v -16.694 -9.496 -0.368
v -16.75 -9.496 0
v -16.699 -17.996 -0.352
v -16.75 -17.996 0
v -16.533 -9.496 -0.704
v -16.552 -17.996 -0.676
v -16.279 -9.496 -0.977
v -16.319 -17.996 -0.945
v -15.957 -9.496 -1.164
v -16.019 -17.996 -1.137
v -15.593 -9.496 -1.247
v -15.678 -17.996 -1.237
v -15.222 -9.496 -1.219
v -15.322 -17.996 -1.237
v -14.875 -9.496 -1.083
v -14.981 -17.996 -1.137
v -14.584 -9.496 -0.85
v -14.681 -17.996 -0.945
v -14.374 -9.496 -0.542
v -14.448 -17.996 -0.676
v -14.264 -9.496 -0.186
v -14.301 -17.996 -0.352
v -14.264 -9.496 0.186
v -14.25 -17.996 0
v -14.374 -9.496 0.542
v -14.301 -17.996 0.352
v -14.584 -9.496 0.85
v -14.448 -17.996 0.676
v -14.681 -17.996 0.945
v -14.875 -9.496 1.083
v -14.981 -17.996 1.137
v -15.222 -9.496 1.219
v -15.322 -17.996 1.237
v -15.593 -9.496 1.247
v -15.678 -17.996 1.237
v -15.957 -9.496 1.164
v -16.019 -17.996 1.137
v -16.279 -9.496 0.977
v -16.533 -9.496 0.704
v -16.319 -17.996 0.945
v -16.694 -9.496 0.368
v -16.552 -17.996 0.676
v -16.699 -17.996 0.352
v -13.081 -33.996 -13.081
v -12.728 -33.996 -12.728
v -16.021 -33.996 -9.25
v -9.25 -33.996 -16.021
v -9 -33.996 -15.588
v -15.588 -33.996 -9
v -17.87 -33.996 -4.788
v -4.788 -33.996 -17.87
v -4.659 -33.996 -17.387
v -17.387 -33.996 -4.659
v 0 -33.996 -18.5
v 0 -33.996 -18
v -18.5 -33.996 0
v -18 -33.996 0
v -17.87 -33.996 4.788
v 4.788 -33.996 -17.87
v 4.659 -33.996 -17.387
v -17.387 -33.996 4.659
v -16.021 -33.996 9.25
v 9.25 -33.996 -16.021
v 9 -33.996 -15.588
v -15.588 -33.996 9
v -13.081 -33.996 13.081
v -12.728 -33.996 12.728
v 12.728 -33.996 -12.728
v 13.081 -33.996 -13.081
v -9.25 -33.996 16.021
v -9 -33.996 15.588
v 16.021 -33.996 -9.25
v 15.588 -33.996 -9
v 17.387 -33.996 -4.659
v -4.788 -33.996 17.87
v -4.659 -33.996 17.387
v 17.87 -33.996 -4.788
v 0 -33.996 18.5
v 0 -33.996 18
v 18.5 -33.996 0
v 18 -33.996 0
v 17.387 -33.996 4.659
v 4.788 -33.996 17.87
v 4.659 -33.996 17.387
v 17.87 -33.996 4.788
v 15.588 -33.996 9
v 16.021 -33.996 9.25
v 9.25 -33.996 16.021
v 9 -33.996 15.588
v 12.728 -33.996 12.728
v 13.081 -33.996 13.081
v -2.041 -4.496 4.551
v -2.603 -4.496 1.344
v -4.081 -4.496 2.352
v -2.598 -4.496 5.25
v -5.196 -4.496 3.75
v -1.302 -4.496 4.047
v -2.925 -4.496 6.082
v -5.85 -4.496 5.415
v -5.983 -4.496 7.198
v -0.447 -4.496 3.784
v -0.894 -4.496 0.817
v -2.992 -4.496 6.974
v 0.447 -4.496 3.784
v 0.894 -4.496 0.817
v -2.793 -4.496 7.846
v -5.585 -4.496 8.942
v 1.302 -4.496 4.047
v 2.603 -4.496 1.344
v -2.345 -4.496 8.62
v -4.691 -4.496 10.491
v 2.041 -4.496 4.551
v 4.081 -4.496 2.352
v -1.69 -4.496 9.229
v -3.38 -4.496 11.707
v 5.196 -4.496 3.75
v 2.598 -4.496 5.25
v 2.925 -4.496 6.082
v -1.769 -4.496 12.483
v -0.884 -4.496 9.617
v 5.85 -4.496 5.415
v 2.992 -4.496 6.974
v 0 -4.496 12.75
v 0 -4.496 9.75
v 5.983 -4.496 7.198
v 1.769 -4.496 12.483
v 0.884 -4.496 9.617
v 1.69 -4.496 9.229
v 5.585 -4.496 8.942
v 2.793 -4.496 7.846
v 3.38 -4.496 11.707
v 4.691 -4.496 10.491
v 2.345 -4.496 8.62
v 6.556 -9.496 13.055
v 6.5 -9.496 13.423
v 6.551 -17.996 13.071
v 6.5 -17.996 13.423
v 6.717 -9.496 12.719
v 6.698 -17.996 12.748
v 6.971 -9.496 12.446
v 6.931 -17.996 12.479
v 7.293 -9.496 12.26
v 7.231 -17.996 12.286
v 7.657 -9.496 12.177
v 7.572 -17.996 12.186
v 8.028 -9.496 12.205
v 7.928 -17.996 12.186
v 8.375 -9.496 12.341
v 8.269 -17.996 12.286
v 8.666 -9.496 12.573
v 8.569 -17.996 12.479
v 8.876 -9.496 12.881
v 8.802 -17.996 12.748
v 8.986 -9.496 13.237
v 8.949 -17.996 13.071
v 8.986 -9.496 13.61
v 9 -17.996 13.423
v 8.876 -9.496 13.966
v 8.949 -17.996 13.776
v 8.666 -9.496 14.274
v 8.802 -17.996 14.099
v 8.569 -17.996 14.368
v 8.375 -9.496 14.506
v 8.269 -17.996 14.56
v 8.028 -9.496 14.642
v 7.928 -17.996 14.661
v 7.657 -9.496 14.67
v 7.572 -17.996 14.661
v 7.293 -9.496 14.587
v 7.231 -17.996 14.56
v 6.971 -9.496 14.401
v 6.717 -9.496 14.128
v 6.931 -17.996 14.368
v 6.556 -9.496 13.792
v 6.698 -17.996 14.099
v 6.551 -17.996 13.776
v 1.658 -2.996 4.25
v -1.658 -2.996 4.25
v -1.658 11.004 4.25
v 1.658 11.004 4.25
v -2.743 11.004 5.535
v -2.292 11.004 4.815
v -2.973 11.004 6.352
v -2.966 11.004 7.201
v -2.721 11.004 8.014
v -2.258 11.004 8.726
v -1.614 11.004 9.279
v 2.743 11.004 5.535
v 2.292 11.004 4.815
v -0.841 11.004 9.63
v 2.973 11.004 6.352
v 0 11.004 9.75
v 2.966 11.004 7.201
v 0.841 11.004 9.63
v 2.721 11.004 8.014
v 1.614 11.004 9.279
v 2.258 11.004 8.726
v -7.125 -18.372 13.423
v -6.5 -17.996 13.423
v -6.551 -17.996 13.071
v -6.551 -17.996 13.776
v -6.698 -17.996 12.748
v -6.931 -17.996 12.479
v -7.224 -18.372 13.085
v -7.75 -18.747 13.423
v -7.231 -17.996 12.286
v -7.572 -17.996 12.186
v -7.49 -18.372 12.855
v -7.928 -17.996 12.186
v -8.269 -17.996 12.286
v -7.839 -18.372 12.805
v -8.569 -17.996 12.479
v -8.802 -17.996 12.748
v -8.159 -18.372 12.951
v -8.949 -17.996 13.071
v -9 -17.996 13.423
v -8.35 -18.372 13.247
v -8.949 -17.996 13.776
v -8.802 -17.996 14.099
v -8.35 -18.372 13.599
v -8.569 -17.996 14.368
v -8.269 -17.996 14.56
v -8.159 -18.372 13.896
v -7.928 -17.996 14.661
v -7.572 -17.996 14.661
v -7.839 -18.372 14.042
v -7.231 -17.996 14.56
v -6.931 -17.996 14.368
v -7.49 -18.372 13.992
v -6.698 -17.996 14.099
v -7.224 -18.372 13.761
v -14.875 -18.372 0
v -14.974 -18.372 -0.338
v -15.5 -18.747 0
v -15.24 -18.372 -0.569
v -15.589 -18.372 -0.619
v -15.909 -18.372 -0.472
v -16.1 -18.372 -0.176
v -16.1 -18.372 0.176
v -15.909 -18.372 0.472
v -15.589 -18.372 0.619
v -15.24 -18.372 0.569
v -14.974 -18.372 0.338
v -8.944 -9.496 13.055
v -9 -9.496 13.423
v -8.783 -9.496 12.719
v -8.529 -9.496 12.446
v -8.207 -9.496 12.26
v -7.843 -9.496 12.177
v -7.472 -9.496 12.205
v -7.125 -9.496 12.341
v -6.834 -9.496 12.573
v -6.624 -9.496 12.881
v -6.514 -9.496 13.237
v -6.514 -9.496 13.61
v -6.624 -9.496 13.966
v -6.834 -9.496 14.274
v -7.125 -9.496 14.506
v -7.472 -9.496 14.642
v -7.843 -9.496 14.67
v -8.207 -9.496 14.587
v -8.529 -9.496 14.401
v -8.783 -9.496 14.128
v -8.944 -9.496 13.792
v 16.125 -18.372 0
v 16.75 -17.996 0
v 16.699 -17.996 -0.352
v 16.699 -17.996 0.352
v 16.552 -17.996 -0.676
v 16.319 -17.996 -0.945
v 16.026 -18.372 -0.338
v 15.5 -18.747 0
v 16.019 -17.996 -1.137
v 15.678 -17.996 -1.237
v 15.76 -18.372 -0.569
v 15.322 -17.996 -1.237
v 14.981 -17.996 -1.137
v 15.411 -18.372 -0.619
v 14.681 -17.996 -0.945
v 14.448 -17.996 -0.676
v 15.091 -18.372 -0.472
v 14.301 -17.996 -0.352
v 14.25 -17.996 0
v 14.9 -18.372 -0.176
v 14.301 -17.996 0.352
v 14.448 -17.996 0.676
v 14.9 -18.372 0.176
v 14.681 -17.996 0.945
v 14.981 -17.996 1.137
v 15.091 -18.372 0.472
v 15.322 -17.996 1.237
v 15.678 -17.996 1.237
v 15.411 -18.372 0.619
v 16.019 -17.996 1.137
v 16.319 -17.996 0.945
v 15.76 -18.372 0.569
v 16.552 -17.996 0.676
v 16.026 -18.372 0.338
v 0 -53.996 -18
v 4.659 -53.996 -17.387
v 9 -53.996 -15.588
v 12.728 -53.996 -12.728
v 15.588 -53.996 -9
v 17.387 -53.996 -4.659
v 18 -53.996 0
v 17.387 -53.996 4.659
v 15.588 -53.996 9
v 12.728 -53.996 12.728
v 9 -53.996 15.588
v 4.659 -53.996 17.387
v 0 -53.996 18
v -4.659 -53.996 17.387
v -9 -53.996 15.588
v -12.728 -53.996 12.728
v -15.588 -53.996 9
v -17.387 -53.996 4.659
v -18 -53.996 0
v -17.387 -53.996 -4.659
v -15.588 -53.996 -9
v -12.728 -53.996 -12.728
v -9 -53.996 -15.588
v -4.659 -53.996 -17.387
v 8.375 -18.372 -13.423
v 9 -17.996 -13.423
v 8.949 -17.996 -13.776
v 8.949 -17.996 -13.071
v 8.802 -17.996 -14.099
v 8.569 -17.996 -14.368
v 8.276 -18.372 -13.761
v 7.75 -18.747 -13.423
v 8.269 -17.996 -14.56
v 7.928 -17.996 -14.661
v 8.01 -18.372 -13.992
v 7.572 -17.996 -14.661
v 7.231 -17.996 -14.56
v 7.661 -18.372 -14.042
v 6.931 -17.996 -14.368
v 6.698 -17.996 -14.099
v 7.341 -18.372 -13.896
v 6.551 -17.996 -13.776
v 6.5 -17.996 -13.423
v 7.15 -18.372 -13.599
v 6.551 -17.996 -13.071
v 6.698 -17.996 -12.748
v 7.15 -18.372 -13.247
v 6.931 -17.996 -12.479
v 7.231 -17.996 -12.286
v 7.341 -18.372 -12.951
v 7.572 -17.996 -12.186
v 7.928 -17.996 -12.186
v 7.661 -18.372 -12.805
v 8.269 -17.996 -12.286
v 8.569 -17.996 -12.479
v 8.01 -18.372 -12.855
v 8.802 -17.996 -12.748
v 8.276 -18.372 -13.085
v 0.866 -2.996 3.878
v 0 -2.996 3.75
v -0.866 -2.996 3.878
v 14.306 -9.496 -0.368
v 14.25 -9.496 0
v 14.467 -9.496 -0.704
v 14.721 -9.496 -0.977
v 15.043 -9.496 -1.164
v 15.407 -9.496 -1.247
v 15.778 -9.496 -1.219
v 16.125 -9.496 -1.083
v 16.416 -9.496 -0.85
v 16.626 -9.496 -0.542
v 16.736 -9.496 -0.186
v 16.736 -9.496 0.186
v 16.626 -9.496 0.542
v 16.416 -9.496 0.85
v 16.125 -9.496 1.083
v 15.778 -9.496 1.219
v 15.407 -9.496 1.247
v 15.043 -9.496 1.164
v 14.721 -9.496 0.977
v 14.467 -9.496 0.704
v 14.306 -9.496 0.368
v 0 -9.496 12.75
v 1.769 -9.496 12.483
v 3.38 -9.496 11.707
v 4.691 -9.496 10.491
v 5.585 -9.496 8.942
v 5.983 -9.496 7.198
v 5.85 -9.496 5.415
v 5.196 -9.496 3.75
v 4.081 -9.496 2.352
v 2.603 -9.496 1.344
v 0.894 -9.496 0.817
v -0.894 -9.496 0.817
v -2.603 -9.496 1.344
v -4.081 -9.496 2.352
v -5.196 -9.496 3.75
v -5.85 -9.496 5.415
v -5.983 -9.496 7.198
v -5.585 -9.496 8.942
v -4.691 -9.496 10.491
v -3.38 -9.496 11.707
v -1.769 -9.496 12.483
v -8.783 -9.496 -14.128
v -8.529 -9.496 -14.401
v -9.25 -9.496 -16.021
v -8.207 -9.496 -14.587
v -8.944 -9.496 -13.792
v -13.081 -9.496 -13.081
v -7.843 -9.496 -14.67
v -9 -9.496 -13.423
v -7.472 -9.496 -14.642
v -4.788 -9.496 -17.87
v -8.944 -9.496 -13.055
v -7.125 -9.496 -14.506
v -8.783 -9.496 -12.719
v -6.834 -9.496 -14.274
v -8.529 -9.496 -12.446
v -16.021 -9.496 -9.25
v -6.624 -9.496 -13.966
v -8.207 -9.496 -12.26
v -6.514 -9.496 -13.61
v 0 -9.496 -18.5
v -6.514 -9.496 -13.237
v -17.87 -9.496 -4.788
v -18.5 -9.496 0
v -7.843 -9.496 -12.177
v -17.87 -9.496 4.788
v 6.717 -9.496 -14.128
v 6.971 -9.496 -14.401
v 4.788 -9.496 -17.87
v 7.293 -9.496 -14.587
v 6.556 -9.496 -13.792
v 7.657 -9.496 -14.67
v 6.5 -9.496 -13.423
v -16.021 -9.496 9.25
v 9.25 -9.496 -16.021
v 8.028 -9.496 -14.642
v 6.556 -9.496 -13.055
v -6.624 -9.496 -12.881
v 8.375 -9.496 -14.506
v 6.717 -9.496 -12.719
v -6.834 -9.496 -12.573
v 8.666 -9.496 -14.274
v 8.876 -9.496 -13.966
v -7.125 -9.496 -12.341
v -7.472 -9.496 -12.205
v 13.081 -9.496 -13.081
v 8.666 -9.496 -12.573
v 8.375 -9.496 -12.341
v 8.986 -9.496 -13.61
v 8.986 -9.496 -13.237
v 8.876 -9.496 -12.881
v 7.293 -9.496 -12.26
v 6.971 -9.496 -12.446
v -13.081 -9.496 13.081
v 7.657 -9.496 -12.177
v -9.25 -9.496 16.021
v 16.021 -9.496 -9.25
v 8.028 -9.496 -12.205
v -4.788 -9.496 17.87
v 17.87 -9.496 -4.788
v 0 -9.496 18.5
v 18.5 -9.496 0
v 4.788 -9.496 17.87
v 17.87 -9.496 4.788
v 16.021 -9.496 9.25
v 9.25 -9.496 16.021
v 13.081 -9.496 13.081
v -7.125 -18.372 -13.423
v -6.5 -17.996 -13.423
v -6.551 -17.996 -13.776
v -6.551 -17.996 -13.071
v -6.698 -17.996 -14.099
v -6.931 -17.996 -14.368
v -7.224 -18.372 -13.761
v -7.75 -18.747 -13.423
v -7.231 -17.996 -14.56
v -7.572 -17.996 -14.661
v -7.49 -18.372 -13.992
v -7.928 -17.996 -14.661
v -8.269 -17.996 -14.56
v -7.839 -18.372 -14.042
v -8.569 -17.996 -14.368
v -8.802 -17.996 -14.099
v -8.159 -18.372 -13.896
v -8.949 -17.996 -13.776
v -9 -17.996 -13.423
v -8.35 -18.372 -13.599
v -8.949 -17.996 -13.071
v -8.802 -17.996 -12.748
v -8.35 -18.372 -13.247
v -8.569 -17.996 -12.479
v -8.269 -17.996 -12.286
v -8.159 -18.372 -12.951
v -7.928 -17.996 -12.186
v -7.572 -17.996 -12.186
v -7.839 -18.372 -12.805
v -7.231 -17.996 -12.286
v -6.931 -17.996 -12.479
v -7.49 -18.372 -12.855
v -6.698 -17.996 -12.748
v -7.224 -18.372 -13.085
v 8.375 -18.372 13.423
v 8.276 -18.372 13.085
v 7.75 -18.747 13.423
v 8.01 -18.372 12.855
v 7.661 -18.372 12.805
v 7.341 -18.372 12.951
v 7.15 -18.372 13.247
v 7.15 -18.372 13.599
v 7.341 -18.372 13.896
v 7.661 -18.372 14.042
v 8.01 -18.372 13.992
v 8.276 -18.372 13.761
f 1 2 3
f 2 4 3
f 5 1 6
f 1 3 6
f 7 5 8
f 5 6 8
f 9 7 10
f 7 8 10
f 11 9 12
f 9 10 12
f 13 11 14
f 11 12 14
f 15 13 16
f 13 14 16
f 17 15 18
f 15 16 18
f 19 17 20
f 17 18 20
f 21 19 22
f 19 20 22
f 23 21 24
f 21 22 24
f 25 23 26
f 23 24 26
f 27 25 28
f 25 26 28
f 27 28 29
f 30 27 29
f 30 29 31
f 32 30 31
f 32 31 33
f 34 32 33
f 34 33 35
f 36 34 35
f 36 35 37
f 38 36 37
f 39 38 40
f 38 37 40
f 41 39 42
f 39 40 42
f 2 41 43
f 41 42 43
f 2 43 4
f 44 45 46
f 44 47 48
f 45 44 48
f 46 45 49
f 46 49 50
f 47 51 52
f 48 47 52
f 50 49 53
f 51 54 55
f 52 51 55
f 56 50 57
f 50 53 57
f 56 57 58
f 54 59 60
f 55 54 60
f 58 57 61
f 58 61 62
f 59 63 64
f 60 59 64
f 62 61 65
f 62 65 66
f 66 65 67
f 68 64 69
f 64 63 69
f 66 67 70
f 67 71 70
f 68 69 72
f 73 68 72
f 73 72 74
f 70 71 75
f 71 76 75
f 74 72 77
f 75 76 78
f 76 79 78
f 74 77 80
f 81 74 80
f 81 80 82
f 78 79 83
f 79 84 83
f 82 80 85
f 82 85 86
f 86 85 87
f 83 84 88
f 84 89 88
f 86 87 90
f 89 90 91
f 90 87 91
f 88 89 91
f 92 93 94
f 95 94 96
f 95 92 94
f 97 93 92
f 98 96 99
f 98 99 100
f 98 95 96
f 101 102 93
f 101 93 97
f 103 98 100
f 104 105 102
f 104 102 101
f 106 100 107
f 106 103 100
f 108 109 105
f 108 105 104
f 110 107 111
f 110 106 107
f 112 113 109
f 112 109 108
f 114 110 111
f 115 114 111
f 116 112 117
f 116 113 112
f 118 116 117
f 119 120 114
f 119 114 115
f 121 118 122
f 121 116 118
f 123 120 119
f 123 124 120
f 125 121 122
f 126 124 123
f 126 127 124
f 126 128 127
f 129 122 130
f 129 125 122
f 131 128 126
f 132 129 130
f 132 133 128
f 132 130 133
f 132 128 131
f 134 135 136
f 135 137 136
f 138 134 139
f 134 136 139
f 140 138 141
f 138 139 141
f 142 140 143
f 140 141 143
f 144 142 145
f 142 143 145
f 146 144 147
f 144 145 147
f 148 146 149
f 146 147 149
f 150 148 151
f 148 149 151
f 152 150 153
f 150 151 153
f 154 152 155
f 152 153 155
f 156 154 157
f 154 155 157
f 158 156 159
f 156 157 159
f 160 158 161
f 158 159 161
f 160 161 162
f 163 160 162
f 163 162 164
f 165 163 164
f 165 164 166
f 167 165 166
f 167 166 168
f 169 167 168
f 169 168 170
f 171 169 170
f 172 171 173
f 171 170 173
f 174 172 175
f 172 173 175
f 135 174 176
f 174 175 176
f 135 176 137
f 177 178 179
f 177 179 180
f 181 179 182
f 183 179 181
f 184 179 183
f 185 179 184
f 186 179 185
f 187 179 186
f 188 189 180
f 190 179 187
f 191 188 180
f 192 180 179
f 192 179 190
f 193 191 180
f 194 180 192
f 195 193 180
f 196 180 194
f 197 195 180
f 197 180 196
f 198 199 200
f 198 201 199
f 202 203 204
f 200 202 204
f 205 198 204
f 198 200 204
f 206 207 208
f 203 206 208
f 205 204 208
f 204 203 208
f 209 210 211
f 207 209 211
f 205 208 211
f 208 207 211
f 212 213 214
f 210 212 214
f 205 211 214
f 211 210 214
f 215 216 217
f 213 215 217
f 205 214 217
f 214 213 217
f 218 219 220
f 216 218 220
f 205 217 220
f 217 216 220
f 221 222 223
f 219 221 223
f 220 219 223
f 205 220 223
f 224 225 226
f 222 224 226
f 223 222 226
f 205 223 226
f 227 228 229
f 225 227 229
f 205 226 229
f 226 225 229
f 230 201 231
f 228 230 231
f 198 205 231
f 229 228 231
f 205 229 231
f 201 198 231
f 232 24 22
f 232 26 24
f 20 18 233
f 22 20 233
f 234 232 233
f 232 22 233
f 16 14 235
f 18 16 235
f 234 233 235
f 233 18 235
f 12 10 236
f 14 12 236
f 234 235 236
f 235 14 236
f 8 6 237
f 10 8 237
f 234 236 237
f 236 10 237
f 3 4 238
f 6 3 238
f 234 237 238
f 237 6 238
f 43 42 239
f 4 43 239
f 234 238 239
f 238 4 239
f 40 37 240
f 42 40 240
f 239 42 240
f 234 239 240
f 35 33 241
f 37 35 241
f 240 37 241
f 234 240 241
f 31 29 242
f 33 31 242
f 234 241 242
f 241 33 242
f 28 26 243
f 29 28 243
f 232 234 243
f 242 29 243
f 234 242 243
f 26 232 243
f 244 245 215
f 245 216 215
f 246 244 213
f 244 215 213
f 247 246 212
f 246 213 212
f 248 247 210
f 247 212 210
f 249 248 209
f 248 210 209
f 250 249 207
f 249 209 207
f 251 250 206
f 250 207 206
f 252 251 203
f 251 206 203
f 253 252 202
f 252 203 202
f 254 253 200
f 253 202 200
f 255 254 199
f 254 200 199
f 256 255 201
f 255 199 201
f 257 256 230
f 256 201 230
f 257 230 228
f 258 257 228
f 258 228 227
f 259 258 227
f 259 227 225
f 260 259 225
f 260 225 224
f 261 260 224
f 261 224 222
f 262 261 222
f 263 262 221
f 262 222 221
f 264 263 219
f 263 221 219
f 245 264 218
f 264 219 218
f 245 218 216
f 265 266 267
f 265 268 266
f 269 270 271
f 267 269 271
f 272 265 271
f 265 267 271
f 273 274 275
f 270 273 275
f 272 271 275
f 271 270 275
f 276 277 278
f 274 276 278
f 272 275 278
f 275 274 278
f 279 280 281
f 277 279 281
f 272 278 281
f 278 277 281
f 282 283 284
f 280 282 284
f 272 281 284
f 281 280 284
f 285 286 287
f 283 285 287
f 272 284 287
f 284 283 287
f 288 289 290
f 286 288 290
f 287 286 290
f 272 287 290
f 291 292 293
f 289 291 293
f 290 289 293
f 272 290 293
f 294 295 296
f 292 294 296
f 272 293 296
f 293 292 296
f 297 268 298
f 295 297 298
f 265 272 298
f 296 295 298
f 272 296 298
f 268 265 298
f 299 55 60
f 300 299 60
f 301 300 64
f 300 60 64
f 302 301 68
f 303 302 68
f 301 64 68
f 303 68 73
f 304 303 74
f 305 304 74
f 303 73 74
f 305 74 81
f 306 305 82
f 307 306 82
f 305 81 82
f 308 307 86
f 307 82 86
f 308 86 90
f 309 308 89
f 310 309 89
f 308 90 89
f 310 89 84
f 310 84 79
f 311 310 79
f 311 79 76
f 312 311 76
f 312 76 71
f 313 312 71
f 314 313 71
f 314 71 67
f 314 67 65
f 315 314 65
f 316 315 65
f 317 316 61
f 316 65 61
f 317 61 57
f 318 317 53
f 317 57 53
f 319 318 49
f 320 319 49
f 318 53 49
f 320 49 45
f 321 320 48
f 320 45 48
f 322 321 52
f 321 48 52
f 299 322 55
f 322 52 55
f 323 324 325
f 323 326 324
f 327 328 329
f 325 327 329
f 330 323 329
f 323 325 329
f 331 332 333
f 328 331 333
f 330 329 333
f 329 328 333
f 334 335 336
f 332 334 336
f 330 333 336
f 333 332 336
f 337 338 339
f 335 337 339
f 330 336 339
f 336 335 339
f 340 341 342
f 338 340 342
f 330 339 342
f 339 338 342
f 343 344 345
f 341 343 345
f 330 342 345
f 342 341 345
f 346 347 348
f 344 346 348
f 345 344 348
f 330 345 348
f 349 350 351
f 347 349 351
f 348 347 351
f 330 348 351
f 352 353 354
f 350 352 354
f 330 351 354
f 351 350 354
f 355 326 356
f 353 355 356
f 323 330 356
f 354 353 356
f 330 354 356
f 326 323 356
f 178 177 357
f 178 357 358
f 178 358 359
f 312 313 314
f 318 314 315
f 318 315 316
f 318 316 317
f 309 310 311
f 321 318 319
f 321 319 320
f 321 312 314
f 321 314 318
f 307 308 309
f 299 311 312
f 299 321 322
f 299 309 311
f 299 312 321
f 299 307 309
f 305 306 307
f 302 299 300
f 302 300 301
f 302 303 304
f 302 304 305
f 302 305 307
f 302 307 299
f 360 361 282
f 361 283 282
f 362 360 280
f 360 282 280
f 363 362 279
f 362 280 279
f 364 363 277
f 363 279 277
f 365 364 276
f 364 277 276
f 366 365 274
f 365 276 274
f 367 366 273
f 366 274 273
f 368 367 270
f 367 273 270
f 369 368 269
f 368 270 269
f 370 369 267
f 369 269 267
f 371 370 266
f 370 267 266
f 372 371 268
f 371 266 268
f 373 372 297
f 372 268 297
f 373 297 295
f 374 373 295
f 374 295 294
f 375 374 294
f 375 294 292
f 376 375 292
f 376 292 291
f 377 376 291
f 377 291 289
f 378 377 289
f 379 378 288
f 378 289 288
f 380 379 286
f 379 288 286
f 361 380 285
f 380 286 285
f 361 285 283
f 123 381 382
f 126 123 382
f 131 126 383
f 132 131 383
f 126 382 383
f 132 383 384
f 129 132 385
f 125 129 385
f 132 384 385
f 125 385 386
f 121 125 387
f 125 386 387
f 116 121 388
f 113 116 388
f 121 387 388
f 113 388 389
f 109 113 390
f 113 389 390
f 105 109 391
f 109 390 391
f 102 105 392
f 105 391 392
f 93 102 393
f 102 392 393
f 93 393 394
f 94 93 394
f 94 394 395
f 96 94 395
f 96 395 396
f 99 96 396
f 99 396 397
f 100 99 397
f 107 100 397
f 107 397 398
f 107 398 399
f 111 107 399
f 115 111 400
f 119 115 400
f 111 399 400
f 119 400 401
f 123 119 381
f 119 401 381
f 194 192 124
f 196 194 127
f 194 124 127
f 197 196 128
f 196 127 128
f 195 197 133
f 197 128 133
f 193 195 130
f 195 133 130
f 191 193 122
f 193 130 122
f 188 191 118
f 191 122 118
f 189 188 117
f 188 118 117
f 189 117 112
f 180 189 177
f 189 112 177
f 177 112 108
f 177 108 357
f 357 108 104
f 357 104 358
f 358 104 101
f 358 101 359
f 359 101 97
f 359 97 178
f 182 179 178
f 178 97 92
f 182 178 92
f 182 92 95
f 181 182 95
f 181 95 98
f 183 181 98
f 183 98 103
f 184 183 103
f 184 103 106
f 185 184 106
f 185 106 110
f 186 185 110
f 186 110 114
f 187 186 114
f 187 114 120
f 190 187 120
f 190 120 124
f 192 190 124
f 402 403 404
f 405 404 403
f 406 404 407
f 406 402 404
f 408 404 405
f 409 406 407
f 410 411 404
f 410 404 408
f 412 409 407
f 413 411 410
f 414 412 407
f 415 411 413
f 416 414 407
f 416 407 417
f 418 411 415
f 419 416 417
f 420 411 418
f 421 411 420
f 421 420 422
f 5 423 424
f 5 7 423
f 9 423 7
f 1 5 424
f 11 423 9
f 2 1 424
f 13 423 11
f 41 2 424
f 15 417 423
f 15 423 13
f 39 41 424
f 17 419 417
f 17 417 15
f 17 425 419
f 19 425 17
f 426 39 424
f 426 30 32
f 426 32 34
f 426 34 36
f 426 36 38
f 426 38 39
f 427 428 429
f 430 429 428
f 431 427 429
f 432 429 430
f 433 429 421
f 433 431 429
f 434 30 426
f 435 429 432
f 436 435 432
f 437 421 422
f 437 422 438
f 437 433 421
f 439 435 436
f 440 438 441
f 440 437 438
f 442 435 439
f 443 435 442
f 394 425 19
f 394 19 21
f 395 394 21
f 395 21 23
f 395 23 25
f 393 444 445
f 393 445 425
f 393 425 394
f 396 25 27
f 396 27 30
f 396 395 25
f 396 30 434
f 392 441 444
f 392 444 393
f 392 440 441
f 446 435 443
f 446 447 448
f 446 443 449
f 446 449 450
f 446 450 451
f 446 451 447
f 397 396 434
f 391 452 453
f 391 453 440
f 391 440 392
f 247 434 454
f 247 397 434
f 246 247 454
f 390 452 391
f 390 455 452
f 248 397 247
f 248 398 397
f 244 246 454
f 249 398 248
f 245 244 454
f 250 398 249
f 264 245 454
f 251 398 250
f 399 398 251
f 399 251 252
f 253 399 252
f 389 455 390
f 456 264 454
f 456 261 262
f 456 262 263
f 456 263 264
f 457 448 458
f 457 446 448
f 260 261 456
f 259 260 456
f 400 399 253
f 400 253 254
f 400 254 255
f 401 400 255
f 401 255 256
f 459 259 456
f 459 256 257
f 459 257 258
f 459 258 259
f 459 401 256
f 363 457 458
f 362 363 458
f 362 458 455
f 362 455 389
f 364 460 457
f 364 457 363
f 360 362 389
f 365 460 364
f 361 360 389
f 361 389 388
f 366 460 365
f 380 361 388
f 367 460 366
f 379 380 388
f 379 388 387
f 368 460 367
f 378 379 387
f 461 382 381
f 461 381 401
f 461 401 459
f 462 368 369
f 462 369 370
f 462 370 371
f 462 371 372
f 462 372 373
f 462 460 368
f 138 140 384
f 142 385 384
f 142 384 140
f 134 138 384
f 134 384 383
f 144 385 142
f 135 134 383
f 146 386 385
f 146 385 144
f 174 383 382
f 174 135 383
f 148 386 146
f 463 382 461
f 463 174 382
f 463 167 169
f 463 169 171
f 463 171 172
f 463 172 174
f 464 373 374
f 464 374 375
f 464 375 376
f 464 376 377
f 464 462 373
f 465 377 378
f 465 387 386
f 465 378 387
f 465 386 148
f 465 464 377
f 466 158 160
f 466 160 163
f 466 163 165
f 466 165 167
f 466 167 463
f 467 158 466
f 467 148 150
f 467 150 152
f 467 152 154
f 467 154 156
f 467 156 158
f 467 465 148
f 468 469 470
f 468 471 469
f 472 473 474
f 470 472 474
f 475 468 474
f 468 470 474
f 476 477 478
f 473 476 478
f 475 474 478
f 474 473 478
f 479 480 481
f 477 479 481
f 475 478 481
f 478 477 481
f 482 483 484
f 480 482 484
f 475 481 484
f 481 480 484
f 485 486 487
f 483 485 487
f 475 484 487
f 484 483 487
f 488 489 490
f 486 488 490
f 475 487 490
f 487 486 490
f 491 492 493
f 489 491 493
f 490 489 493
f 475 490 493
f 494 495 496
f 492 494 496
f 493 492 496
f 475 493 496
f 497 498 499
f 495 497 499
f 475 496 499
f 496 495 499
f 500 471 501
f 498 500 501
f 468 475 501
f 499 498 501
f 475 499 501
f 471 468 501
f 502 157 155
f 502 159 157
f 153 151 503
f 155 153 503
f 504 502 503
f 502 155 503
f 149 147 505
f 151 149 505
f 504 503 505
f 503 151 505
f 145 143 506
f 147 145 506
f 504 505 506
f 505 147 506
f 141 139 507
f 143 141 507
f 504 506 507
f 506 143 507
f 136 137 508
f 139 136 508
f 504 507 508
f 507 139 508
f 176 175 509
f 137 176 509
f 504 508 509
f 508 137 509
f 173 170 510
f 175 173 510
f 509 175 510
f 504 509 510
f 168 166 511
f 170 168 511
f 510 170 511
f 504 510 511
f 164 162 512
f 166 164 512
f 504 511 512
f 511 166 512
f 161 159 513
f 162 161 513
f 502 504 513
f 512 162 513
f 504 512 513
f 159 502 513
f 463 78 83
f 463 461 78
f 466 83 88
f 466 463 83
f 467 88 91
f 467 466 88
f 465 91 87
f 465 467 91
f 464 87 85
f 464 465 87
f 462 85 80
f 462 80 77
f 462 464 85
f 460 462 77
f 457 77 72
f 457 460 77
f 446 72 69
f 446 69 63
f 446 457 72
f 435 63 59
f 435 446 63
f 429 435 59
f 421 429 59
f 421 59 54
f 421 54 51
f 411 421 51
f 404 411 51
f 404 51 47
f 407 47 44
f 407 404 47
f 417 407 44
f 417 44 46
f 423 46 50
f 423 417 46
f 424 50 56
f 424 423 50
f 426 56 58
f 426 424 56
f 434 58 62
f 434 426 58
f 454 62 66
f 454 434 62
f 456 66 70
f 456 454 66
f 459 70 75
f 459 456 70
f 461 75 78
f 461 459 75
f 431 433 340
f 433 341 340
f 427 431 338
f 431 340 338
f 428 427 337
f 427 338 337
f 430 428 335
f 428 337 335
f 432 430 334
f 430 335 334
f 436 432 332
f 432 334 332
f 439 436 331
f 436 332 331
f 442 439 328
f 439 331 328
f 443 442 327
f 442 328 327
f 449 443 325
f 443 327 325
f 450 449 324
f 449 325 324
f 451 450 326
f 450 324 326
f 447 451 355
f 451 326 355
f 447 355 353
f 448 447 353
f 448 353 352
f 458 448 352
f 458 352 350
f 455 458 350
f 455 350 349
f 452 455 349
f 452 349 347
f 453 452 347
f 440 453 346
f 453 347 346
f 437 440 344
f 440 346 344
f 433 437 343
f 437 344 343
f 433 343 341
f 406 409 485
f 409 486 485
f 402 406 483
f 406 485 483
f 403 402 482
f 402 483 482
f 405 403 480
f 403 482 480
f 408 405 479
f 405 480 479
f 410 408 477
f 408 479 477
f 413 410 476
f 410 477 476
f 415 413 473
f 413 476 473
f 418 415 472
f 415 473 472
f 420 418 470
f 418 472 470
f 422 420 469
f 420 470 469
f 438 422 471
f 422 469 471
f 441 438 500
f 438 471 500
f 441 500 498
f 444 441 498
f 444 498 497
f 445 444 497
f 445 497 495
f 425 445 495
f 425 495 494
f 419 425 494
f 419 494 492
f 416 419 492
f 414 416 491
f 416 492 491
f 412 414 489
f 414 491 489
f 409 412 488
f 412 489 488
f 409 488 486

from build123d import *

# Parameters (mm, degrees)
SKETCH_1_W                  = 18.5
SKETCH_1_H                  = 24.5
SKETCH_2_R                  = 6
EXTRUDE_1_DEPTH             = 5
SKETCH_3_R                  = 3
EXTRUDE_2_DEPTH             = 15.5
CUT_EXTRUDE_START           = -14
CUT_EXTRUDE_1_DEPTH         = 14
SKETCH_5_R                  = 18
EXTRUDE_3_DEPTH             = 20
HOLE_WIZARD_2_5_2_5_1_D     = 2.5
HOLE_WIZARD_2_5_2_5_1_DEPTH = 8.5
HOLE_WIZARD_2_5_2_5_1_TIP   = 0.751075774


with BuildPart() as part:
    # 草图1 → 旋转1 (revolve)
    with BuildSketch(Plane(origin=(0, 0, 0), x_dir=(-1, 0, 0), z_dir=(0, 0, -1)), mode=Mode.PRIVATE) as revolve_1_sk:
        with Locations((-9.25, -21.746377743)):
            Rectangle(SKETCH_1_W, SKETCH_1_H)
    revolve(revolve_1_sk.sketch.rotate(Axis((0, -33.996377743, 0), (0, 1, 0)), 270), axis=Axis((0, -33.996377743, 0), (0, 1, 0)))

    # 草图2 → 凸台-拉伸1 (add)
    with BuildSketch(Plane(origin=(0, -9.496377743, 0), x_dir=(-1, 0, 0), z_dir=(0, 1, 0))):
        with Locations(Location((0, 6.75, 0), (0, 0, 90))):
            Circle(SKETCH_2_R)
    extrude(amount=EXTRUDE_1_DEPTH)

    # 草图3 → 凸台-拉伸2 (add)
    with BuildSketch(Plane(origin=(0, -4.496377743, 0), x_dir=(-1, 0, 0), z_dir=(0, 1, 0))):
        with Locations(Location((0, 6.75, 0), (0, 0, 90))):
            Circle(SKETCH_3_R)
    extrude(amount=EXTRUDE_2_DEPTH)

    # 草图4 → 切除-拉伸1 (cut)
    with BuildSketch(Plane(origin=(0, 11.003622257, 0), x_dir=(-1, 0, 0), z_dir=(0, 1, 0)).offset(CUT_EXTRUDE_START)):
        with BuildLine():
            Line((1.658312395, 4.25), (-1.658312395, 4.25))
            ThreePointArc((-1.658312395, 4.25), (0, 3.75), (1.658312395, 4.25))
        make_face()
    extrude(amount=CUT_EXTRUDE_1_DEPTH, mode=Mode.SUBTRACT)

    # 草图5 → 凸台-拉伸3 (add)
    with BuildSketch(Plane.XZ.offset(33.996377743)):
        with Locations(Location((0, 0, 0), (0, 0, 270))):
            Circle(SKETCH_5_R)
    extrude(amount=EXTRUDE_3_DEPTH)

    # Ø2.5 (2.5) 直径孔1
    with Locations(Plane(origin=(0, -9.496377743, 0), x_dir=(1, 0, 0), z_dir=(0, 1, 0))):
        with Locations((-7.75, 13.423393759), (7.75, 13.423393759), (15.5, 0), (7.75, -13.423393759), (-7.75, -13.423393759), (-15.5, 0)):
            Hole(HOLE_WIZARD_2_5_2_5_1_D / 2, depth=HOLE_WIZARD_2_5_2_5_1_DEPTH)
            with Locations((0, 0, -(HOLE_WIZARD_2_5_2_5_1_DEPTH + HOLE_WIZARD_2_5_2_5_1_TIP / 2))):  # 118° drill point
                Cone(0, HOLE_WIZARD_2_5_2_5_1_D / 2, HOLE_WIZARD_2_5_2_5_1_TIP, mode=Mode.SUBTRACT)


solid = part.part
